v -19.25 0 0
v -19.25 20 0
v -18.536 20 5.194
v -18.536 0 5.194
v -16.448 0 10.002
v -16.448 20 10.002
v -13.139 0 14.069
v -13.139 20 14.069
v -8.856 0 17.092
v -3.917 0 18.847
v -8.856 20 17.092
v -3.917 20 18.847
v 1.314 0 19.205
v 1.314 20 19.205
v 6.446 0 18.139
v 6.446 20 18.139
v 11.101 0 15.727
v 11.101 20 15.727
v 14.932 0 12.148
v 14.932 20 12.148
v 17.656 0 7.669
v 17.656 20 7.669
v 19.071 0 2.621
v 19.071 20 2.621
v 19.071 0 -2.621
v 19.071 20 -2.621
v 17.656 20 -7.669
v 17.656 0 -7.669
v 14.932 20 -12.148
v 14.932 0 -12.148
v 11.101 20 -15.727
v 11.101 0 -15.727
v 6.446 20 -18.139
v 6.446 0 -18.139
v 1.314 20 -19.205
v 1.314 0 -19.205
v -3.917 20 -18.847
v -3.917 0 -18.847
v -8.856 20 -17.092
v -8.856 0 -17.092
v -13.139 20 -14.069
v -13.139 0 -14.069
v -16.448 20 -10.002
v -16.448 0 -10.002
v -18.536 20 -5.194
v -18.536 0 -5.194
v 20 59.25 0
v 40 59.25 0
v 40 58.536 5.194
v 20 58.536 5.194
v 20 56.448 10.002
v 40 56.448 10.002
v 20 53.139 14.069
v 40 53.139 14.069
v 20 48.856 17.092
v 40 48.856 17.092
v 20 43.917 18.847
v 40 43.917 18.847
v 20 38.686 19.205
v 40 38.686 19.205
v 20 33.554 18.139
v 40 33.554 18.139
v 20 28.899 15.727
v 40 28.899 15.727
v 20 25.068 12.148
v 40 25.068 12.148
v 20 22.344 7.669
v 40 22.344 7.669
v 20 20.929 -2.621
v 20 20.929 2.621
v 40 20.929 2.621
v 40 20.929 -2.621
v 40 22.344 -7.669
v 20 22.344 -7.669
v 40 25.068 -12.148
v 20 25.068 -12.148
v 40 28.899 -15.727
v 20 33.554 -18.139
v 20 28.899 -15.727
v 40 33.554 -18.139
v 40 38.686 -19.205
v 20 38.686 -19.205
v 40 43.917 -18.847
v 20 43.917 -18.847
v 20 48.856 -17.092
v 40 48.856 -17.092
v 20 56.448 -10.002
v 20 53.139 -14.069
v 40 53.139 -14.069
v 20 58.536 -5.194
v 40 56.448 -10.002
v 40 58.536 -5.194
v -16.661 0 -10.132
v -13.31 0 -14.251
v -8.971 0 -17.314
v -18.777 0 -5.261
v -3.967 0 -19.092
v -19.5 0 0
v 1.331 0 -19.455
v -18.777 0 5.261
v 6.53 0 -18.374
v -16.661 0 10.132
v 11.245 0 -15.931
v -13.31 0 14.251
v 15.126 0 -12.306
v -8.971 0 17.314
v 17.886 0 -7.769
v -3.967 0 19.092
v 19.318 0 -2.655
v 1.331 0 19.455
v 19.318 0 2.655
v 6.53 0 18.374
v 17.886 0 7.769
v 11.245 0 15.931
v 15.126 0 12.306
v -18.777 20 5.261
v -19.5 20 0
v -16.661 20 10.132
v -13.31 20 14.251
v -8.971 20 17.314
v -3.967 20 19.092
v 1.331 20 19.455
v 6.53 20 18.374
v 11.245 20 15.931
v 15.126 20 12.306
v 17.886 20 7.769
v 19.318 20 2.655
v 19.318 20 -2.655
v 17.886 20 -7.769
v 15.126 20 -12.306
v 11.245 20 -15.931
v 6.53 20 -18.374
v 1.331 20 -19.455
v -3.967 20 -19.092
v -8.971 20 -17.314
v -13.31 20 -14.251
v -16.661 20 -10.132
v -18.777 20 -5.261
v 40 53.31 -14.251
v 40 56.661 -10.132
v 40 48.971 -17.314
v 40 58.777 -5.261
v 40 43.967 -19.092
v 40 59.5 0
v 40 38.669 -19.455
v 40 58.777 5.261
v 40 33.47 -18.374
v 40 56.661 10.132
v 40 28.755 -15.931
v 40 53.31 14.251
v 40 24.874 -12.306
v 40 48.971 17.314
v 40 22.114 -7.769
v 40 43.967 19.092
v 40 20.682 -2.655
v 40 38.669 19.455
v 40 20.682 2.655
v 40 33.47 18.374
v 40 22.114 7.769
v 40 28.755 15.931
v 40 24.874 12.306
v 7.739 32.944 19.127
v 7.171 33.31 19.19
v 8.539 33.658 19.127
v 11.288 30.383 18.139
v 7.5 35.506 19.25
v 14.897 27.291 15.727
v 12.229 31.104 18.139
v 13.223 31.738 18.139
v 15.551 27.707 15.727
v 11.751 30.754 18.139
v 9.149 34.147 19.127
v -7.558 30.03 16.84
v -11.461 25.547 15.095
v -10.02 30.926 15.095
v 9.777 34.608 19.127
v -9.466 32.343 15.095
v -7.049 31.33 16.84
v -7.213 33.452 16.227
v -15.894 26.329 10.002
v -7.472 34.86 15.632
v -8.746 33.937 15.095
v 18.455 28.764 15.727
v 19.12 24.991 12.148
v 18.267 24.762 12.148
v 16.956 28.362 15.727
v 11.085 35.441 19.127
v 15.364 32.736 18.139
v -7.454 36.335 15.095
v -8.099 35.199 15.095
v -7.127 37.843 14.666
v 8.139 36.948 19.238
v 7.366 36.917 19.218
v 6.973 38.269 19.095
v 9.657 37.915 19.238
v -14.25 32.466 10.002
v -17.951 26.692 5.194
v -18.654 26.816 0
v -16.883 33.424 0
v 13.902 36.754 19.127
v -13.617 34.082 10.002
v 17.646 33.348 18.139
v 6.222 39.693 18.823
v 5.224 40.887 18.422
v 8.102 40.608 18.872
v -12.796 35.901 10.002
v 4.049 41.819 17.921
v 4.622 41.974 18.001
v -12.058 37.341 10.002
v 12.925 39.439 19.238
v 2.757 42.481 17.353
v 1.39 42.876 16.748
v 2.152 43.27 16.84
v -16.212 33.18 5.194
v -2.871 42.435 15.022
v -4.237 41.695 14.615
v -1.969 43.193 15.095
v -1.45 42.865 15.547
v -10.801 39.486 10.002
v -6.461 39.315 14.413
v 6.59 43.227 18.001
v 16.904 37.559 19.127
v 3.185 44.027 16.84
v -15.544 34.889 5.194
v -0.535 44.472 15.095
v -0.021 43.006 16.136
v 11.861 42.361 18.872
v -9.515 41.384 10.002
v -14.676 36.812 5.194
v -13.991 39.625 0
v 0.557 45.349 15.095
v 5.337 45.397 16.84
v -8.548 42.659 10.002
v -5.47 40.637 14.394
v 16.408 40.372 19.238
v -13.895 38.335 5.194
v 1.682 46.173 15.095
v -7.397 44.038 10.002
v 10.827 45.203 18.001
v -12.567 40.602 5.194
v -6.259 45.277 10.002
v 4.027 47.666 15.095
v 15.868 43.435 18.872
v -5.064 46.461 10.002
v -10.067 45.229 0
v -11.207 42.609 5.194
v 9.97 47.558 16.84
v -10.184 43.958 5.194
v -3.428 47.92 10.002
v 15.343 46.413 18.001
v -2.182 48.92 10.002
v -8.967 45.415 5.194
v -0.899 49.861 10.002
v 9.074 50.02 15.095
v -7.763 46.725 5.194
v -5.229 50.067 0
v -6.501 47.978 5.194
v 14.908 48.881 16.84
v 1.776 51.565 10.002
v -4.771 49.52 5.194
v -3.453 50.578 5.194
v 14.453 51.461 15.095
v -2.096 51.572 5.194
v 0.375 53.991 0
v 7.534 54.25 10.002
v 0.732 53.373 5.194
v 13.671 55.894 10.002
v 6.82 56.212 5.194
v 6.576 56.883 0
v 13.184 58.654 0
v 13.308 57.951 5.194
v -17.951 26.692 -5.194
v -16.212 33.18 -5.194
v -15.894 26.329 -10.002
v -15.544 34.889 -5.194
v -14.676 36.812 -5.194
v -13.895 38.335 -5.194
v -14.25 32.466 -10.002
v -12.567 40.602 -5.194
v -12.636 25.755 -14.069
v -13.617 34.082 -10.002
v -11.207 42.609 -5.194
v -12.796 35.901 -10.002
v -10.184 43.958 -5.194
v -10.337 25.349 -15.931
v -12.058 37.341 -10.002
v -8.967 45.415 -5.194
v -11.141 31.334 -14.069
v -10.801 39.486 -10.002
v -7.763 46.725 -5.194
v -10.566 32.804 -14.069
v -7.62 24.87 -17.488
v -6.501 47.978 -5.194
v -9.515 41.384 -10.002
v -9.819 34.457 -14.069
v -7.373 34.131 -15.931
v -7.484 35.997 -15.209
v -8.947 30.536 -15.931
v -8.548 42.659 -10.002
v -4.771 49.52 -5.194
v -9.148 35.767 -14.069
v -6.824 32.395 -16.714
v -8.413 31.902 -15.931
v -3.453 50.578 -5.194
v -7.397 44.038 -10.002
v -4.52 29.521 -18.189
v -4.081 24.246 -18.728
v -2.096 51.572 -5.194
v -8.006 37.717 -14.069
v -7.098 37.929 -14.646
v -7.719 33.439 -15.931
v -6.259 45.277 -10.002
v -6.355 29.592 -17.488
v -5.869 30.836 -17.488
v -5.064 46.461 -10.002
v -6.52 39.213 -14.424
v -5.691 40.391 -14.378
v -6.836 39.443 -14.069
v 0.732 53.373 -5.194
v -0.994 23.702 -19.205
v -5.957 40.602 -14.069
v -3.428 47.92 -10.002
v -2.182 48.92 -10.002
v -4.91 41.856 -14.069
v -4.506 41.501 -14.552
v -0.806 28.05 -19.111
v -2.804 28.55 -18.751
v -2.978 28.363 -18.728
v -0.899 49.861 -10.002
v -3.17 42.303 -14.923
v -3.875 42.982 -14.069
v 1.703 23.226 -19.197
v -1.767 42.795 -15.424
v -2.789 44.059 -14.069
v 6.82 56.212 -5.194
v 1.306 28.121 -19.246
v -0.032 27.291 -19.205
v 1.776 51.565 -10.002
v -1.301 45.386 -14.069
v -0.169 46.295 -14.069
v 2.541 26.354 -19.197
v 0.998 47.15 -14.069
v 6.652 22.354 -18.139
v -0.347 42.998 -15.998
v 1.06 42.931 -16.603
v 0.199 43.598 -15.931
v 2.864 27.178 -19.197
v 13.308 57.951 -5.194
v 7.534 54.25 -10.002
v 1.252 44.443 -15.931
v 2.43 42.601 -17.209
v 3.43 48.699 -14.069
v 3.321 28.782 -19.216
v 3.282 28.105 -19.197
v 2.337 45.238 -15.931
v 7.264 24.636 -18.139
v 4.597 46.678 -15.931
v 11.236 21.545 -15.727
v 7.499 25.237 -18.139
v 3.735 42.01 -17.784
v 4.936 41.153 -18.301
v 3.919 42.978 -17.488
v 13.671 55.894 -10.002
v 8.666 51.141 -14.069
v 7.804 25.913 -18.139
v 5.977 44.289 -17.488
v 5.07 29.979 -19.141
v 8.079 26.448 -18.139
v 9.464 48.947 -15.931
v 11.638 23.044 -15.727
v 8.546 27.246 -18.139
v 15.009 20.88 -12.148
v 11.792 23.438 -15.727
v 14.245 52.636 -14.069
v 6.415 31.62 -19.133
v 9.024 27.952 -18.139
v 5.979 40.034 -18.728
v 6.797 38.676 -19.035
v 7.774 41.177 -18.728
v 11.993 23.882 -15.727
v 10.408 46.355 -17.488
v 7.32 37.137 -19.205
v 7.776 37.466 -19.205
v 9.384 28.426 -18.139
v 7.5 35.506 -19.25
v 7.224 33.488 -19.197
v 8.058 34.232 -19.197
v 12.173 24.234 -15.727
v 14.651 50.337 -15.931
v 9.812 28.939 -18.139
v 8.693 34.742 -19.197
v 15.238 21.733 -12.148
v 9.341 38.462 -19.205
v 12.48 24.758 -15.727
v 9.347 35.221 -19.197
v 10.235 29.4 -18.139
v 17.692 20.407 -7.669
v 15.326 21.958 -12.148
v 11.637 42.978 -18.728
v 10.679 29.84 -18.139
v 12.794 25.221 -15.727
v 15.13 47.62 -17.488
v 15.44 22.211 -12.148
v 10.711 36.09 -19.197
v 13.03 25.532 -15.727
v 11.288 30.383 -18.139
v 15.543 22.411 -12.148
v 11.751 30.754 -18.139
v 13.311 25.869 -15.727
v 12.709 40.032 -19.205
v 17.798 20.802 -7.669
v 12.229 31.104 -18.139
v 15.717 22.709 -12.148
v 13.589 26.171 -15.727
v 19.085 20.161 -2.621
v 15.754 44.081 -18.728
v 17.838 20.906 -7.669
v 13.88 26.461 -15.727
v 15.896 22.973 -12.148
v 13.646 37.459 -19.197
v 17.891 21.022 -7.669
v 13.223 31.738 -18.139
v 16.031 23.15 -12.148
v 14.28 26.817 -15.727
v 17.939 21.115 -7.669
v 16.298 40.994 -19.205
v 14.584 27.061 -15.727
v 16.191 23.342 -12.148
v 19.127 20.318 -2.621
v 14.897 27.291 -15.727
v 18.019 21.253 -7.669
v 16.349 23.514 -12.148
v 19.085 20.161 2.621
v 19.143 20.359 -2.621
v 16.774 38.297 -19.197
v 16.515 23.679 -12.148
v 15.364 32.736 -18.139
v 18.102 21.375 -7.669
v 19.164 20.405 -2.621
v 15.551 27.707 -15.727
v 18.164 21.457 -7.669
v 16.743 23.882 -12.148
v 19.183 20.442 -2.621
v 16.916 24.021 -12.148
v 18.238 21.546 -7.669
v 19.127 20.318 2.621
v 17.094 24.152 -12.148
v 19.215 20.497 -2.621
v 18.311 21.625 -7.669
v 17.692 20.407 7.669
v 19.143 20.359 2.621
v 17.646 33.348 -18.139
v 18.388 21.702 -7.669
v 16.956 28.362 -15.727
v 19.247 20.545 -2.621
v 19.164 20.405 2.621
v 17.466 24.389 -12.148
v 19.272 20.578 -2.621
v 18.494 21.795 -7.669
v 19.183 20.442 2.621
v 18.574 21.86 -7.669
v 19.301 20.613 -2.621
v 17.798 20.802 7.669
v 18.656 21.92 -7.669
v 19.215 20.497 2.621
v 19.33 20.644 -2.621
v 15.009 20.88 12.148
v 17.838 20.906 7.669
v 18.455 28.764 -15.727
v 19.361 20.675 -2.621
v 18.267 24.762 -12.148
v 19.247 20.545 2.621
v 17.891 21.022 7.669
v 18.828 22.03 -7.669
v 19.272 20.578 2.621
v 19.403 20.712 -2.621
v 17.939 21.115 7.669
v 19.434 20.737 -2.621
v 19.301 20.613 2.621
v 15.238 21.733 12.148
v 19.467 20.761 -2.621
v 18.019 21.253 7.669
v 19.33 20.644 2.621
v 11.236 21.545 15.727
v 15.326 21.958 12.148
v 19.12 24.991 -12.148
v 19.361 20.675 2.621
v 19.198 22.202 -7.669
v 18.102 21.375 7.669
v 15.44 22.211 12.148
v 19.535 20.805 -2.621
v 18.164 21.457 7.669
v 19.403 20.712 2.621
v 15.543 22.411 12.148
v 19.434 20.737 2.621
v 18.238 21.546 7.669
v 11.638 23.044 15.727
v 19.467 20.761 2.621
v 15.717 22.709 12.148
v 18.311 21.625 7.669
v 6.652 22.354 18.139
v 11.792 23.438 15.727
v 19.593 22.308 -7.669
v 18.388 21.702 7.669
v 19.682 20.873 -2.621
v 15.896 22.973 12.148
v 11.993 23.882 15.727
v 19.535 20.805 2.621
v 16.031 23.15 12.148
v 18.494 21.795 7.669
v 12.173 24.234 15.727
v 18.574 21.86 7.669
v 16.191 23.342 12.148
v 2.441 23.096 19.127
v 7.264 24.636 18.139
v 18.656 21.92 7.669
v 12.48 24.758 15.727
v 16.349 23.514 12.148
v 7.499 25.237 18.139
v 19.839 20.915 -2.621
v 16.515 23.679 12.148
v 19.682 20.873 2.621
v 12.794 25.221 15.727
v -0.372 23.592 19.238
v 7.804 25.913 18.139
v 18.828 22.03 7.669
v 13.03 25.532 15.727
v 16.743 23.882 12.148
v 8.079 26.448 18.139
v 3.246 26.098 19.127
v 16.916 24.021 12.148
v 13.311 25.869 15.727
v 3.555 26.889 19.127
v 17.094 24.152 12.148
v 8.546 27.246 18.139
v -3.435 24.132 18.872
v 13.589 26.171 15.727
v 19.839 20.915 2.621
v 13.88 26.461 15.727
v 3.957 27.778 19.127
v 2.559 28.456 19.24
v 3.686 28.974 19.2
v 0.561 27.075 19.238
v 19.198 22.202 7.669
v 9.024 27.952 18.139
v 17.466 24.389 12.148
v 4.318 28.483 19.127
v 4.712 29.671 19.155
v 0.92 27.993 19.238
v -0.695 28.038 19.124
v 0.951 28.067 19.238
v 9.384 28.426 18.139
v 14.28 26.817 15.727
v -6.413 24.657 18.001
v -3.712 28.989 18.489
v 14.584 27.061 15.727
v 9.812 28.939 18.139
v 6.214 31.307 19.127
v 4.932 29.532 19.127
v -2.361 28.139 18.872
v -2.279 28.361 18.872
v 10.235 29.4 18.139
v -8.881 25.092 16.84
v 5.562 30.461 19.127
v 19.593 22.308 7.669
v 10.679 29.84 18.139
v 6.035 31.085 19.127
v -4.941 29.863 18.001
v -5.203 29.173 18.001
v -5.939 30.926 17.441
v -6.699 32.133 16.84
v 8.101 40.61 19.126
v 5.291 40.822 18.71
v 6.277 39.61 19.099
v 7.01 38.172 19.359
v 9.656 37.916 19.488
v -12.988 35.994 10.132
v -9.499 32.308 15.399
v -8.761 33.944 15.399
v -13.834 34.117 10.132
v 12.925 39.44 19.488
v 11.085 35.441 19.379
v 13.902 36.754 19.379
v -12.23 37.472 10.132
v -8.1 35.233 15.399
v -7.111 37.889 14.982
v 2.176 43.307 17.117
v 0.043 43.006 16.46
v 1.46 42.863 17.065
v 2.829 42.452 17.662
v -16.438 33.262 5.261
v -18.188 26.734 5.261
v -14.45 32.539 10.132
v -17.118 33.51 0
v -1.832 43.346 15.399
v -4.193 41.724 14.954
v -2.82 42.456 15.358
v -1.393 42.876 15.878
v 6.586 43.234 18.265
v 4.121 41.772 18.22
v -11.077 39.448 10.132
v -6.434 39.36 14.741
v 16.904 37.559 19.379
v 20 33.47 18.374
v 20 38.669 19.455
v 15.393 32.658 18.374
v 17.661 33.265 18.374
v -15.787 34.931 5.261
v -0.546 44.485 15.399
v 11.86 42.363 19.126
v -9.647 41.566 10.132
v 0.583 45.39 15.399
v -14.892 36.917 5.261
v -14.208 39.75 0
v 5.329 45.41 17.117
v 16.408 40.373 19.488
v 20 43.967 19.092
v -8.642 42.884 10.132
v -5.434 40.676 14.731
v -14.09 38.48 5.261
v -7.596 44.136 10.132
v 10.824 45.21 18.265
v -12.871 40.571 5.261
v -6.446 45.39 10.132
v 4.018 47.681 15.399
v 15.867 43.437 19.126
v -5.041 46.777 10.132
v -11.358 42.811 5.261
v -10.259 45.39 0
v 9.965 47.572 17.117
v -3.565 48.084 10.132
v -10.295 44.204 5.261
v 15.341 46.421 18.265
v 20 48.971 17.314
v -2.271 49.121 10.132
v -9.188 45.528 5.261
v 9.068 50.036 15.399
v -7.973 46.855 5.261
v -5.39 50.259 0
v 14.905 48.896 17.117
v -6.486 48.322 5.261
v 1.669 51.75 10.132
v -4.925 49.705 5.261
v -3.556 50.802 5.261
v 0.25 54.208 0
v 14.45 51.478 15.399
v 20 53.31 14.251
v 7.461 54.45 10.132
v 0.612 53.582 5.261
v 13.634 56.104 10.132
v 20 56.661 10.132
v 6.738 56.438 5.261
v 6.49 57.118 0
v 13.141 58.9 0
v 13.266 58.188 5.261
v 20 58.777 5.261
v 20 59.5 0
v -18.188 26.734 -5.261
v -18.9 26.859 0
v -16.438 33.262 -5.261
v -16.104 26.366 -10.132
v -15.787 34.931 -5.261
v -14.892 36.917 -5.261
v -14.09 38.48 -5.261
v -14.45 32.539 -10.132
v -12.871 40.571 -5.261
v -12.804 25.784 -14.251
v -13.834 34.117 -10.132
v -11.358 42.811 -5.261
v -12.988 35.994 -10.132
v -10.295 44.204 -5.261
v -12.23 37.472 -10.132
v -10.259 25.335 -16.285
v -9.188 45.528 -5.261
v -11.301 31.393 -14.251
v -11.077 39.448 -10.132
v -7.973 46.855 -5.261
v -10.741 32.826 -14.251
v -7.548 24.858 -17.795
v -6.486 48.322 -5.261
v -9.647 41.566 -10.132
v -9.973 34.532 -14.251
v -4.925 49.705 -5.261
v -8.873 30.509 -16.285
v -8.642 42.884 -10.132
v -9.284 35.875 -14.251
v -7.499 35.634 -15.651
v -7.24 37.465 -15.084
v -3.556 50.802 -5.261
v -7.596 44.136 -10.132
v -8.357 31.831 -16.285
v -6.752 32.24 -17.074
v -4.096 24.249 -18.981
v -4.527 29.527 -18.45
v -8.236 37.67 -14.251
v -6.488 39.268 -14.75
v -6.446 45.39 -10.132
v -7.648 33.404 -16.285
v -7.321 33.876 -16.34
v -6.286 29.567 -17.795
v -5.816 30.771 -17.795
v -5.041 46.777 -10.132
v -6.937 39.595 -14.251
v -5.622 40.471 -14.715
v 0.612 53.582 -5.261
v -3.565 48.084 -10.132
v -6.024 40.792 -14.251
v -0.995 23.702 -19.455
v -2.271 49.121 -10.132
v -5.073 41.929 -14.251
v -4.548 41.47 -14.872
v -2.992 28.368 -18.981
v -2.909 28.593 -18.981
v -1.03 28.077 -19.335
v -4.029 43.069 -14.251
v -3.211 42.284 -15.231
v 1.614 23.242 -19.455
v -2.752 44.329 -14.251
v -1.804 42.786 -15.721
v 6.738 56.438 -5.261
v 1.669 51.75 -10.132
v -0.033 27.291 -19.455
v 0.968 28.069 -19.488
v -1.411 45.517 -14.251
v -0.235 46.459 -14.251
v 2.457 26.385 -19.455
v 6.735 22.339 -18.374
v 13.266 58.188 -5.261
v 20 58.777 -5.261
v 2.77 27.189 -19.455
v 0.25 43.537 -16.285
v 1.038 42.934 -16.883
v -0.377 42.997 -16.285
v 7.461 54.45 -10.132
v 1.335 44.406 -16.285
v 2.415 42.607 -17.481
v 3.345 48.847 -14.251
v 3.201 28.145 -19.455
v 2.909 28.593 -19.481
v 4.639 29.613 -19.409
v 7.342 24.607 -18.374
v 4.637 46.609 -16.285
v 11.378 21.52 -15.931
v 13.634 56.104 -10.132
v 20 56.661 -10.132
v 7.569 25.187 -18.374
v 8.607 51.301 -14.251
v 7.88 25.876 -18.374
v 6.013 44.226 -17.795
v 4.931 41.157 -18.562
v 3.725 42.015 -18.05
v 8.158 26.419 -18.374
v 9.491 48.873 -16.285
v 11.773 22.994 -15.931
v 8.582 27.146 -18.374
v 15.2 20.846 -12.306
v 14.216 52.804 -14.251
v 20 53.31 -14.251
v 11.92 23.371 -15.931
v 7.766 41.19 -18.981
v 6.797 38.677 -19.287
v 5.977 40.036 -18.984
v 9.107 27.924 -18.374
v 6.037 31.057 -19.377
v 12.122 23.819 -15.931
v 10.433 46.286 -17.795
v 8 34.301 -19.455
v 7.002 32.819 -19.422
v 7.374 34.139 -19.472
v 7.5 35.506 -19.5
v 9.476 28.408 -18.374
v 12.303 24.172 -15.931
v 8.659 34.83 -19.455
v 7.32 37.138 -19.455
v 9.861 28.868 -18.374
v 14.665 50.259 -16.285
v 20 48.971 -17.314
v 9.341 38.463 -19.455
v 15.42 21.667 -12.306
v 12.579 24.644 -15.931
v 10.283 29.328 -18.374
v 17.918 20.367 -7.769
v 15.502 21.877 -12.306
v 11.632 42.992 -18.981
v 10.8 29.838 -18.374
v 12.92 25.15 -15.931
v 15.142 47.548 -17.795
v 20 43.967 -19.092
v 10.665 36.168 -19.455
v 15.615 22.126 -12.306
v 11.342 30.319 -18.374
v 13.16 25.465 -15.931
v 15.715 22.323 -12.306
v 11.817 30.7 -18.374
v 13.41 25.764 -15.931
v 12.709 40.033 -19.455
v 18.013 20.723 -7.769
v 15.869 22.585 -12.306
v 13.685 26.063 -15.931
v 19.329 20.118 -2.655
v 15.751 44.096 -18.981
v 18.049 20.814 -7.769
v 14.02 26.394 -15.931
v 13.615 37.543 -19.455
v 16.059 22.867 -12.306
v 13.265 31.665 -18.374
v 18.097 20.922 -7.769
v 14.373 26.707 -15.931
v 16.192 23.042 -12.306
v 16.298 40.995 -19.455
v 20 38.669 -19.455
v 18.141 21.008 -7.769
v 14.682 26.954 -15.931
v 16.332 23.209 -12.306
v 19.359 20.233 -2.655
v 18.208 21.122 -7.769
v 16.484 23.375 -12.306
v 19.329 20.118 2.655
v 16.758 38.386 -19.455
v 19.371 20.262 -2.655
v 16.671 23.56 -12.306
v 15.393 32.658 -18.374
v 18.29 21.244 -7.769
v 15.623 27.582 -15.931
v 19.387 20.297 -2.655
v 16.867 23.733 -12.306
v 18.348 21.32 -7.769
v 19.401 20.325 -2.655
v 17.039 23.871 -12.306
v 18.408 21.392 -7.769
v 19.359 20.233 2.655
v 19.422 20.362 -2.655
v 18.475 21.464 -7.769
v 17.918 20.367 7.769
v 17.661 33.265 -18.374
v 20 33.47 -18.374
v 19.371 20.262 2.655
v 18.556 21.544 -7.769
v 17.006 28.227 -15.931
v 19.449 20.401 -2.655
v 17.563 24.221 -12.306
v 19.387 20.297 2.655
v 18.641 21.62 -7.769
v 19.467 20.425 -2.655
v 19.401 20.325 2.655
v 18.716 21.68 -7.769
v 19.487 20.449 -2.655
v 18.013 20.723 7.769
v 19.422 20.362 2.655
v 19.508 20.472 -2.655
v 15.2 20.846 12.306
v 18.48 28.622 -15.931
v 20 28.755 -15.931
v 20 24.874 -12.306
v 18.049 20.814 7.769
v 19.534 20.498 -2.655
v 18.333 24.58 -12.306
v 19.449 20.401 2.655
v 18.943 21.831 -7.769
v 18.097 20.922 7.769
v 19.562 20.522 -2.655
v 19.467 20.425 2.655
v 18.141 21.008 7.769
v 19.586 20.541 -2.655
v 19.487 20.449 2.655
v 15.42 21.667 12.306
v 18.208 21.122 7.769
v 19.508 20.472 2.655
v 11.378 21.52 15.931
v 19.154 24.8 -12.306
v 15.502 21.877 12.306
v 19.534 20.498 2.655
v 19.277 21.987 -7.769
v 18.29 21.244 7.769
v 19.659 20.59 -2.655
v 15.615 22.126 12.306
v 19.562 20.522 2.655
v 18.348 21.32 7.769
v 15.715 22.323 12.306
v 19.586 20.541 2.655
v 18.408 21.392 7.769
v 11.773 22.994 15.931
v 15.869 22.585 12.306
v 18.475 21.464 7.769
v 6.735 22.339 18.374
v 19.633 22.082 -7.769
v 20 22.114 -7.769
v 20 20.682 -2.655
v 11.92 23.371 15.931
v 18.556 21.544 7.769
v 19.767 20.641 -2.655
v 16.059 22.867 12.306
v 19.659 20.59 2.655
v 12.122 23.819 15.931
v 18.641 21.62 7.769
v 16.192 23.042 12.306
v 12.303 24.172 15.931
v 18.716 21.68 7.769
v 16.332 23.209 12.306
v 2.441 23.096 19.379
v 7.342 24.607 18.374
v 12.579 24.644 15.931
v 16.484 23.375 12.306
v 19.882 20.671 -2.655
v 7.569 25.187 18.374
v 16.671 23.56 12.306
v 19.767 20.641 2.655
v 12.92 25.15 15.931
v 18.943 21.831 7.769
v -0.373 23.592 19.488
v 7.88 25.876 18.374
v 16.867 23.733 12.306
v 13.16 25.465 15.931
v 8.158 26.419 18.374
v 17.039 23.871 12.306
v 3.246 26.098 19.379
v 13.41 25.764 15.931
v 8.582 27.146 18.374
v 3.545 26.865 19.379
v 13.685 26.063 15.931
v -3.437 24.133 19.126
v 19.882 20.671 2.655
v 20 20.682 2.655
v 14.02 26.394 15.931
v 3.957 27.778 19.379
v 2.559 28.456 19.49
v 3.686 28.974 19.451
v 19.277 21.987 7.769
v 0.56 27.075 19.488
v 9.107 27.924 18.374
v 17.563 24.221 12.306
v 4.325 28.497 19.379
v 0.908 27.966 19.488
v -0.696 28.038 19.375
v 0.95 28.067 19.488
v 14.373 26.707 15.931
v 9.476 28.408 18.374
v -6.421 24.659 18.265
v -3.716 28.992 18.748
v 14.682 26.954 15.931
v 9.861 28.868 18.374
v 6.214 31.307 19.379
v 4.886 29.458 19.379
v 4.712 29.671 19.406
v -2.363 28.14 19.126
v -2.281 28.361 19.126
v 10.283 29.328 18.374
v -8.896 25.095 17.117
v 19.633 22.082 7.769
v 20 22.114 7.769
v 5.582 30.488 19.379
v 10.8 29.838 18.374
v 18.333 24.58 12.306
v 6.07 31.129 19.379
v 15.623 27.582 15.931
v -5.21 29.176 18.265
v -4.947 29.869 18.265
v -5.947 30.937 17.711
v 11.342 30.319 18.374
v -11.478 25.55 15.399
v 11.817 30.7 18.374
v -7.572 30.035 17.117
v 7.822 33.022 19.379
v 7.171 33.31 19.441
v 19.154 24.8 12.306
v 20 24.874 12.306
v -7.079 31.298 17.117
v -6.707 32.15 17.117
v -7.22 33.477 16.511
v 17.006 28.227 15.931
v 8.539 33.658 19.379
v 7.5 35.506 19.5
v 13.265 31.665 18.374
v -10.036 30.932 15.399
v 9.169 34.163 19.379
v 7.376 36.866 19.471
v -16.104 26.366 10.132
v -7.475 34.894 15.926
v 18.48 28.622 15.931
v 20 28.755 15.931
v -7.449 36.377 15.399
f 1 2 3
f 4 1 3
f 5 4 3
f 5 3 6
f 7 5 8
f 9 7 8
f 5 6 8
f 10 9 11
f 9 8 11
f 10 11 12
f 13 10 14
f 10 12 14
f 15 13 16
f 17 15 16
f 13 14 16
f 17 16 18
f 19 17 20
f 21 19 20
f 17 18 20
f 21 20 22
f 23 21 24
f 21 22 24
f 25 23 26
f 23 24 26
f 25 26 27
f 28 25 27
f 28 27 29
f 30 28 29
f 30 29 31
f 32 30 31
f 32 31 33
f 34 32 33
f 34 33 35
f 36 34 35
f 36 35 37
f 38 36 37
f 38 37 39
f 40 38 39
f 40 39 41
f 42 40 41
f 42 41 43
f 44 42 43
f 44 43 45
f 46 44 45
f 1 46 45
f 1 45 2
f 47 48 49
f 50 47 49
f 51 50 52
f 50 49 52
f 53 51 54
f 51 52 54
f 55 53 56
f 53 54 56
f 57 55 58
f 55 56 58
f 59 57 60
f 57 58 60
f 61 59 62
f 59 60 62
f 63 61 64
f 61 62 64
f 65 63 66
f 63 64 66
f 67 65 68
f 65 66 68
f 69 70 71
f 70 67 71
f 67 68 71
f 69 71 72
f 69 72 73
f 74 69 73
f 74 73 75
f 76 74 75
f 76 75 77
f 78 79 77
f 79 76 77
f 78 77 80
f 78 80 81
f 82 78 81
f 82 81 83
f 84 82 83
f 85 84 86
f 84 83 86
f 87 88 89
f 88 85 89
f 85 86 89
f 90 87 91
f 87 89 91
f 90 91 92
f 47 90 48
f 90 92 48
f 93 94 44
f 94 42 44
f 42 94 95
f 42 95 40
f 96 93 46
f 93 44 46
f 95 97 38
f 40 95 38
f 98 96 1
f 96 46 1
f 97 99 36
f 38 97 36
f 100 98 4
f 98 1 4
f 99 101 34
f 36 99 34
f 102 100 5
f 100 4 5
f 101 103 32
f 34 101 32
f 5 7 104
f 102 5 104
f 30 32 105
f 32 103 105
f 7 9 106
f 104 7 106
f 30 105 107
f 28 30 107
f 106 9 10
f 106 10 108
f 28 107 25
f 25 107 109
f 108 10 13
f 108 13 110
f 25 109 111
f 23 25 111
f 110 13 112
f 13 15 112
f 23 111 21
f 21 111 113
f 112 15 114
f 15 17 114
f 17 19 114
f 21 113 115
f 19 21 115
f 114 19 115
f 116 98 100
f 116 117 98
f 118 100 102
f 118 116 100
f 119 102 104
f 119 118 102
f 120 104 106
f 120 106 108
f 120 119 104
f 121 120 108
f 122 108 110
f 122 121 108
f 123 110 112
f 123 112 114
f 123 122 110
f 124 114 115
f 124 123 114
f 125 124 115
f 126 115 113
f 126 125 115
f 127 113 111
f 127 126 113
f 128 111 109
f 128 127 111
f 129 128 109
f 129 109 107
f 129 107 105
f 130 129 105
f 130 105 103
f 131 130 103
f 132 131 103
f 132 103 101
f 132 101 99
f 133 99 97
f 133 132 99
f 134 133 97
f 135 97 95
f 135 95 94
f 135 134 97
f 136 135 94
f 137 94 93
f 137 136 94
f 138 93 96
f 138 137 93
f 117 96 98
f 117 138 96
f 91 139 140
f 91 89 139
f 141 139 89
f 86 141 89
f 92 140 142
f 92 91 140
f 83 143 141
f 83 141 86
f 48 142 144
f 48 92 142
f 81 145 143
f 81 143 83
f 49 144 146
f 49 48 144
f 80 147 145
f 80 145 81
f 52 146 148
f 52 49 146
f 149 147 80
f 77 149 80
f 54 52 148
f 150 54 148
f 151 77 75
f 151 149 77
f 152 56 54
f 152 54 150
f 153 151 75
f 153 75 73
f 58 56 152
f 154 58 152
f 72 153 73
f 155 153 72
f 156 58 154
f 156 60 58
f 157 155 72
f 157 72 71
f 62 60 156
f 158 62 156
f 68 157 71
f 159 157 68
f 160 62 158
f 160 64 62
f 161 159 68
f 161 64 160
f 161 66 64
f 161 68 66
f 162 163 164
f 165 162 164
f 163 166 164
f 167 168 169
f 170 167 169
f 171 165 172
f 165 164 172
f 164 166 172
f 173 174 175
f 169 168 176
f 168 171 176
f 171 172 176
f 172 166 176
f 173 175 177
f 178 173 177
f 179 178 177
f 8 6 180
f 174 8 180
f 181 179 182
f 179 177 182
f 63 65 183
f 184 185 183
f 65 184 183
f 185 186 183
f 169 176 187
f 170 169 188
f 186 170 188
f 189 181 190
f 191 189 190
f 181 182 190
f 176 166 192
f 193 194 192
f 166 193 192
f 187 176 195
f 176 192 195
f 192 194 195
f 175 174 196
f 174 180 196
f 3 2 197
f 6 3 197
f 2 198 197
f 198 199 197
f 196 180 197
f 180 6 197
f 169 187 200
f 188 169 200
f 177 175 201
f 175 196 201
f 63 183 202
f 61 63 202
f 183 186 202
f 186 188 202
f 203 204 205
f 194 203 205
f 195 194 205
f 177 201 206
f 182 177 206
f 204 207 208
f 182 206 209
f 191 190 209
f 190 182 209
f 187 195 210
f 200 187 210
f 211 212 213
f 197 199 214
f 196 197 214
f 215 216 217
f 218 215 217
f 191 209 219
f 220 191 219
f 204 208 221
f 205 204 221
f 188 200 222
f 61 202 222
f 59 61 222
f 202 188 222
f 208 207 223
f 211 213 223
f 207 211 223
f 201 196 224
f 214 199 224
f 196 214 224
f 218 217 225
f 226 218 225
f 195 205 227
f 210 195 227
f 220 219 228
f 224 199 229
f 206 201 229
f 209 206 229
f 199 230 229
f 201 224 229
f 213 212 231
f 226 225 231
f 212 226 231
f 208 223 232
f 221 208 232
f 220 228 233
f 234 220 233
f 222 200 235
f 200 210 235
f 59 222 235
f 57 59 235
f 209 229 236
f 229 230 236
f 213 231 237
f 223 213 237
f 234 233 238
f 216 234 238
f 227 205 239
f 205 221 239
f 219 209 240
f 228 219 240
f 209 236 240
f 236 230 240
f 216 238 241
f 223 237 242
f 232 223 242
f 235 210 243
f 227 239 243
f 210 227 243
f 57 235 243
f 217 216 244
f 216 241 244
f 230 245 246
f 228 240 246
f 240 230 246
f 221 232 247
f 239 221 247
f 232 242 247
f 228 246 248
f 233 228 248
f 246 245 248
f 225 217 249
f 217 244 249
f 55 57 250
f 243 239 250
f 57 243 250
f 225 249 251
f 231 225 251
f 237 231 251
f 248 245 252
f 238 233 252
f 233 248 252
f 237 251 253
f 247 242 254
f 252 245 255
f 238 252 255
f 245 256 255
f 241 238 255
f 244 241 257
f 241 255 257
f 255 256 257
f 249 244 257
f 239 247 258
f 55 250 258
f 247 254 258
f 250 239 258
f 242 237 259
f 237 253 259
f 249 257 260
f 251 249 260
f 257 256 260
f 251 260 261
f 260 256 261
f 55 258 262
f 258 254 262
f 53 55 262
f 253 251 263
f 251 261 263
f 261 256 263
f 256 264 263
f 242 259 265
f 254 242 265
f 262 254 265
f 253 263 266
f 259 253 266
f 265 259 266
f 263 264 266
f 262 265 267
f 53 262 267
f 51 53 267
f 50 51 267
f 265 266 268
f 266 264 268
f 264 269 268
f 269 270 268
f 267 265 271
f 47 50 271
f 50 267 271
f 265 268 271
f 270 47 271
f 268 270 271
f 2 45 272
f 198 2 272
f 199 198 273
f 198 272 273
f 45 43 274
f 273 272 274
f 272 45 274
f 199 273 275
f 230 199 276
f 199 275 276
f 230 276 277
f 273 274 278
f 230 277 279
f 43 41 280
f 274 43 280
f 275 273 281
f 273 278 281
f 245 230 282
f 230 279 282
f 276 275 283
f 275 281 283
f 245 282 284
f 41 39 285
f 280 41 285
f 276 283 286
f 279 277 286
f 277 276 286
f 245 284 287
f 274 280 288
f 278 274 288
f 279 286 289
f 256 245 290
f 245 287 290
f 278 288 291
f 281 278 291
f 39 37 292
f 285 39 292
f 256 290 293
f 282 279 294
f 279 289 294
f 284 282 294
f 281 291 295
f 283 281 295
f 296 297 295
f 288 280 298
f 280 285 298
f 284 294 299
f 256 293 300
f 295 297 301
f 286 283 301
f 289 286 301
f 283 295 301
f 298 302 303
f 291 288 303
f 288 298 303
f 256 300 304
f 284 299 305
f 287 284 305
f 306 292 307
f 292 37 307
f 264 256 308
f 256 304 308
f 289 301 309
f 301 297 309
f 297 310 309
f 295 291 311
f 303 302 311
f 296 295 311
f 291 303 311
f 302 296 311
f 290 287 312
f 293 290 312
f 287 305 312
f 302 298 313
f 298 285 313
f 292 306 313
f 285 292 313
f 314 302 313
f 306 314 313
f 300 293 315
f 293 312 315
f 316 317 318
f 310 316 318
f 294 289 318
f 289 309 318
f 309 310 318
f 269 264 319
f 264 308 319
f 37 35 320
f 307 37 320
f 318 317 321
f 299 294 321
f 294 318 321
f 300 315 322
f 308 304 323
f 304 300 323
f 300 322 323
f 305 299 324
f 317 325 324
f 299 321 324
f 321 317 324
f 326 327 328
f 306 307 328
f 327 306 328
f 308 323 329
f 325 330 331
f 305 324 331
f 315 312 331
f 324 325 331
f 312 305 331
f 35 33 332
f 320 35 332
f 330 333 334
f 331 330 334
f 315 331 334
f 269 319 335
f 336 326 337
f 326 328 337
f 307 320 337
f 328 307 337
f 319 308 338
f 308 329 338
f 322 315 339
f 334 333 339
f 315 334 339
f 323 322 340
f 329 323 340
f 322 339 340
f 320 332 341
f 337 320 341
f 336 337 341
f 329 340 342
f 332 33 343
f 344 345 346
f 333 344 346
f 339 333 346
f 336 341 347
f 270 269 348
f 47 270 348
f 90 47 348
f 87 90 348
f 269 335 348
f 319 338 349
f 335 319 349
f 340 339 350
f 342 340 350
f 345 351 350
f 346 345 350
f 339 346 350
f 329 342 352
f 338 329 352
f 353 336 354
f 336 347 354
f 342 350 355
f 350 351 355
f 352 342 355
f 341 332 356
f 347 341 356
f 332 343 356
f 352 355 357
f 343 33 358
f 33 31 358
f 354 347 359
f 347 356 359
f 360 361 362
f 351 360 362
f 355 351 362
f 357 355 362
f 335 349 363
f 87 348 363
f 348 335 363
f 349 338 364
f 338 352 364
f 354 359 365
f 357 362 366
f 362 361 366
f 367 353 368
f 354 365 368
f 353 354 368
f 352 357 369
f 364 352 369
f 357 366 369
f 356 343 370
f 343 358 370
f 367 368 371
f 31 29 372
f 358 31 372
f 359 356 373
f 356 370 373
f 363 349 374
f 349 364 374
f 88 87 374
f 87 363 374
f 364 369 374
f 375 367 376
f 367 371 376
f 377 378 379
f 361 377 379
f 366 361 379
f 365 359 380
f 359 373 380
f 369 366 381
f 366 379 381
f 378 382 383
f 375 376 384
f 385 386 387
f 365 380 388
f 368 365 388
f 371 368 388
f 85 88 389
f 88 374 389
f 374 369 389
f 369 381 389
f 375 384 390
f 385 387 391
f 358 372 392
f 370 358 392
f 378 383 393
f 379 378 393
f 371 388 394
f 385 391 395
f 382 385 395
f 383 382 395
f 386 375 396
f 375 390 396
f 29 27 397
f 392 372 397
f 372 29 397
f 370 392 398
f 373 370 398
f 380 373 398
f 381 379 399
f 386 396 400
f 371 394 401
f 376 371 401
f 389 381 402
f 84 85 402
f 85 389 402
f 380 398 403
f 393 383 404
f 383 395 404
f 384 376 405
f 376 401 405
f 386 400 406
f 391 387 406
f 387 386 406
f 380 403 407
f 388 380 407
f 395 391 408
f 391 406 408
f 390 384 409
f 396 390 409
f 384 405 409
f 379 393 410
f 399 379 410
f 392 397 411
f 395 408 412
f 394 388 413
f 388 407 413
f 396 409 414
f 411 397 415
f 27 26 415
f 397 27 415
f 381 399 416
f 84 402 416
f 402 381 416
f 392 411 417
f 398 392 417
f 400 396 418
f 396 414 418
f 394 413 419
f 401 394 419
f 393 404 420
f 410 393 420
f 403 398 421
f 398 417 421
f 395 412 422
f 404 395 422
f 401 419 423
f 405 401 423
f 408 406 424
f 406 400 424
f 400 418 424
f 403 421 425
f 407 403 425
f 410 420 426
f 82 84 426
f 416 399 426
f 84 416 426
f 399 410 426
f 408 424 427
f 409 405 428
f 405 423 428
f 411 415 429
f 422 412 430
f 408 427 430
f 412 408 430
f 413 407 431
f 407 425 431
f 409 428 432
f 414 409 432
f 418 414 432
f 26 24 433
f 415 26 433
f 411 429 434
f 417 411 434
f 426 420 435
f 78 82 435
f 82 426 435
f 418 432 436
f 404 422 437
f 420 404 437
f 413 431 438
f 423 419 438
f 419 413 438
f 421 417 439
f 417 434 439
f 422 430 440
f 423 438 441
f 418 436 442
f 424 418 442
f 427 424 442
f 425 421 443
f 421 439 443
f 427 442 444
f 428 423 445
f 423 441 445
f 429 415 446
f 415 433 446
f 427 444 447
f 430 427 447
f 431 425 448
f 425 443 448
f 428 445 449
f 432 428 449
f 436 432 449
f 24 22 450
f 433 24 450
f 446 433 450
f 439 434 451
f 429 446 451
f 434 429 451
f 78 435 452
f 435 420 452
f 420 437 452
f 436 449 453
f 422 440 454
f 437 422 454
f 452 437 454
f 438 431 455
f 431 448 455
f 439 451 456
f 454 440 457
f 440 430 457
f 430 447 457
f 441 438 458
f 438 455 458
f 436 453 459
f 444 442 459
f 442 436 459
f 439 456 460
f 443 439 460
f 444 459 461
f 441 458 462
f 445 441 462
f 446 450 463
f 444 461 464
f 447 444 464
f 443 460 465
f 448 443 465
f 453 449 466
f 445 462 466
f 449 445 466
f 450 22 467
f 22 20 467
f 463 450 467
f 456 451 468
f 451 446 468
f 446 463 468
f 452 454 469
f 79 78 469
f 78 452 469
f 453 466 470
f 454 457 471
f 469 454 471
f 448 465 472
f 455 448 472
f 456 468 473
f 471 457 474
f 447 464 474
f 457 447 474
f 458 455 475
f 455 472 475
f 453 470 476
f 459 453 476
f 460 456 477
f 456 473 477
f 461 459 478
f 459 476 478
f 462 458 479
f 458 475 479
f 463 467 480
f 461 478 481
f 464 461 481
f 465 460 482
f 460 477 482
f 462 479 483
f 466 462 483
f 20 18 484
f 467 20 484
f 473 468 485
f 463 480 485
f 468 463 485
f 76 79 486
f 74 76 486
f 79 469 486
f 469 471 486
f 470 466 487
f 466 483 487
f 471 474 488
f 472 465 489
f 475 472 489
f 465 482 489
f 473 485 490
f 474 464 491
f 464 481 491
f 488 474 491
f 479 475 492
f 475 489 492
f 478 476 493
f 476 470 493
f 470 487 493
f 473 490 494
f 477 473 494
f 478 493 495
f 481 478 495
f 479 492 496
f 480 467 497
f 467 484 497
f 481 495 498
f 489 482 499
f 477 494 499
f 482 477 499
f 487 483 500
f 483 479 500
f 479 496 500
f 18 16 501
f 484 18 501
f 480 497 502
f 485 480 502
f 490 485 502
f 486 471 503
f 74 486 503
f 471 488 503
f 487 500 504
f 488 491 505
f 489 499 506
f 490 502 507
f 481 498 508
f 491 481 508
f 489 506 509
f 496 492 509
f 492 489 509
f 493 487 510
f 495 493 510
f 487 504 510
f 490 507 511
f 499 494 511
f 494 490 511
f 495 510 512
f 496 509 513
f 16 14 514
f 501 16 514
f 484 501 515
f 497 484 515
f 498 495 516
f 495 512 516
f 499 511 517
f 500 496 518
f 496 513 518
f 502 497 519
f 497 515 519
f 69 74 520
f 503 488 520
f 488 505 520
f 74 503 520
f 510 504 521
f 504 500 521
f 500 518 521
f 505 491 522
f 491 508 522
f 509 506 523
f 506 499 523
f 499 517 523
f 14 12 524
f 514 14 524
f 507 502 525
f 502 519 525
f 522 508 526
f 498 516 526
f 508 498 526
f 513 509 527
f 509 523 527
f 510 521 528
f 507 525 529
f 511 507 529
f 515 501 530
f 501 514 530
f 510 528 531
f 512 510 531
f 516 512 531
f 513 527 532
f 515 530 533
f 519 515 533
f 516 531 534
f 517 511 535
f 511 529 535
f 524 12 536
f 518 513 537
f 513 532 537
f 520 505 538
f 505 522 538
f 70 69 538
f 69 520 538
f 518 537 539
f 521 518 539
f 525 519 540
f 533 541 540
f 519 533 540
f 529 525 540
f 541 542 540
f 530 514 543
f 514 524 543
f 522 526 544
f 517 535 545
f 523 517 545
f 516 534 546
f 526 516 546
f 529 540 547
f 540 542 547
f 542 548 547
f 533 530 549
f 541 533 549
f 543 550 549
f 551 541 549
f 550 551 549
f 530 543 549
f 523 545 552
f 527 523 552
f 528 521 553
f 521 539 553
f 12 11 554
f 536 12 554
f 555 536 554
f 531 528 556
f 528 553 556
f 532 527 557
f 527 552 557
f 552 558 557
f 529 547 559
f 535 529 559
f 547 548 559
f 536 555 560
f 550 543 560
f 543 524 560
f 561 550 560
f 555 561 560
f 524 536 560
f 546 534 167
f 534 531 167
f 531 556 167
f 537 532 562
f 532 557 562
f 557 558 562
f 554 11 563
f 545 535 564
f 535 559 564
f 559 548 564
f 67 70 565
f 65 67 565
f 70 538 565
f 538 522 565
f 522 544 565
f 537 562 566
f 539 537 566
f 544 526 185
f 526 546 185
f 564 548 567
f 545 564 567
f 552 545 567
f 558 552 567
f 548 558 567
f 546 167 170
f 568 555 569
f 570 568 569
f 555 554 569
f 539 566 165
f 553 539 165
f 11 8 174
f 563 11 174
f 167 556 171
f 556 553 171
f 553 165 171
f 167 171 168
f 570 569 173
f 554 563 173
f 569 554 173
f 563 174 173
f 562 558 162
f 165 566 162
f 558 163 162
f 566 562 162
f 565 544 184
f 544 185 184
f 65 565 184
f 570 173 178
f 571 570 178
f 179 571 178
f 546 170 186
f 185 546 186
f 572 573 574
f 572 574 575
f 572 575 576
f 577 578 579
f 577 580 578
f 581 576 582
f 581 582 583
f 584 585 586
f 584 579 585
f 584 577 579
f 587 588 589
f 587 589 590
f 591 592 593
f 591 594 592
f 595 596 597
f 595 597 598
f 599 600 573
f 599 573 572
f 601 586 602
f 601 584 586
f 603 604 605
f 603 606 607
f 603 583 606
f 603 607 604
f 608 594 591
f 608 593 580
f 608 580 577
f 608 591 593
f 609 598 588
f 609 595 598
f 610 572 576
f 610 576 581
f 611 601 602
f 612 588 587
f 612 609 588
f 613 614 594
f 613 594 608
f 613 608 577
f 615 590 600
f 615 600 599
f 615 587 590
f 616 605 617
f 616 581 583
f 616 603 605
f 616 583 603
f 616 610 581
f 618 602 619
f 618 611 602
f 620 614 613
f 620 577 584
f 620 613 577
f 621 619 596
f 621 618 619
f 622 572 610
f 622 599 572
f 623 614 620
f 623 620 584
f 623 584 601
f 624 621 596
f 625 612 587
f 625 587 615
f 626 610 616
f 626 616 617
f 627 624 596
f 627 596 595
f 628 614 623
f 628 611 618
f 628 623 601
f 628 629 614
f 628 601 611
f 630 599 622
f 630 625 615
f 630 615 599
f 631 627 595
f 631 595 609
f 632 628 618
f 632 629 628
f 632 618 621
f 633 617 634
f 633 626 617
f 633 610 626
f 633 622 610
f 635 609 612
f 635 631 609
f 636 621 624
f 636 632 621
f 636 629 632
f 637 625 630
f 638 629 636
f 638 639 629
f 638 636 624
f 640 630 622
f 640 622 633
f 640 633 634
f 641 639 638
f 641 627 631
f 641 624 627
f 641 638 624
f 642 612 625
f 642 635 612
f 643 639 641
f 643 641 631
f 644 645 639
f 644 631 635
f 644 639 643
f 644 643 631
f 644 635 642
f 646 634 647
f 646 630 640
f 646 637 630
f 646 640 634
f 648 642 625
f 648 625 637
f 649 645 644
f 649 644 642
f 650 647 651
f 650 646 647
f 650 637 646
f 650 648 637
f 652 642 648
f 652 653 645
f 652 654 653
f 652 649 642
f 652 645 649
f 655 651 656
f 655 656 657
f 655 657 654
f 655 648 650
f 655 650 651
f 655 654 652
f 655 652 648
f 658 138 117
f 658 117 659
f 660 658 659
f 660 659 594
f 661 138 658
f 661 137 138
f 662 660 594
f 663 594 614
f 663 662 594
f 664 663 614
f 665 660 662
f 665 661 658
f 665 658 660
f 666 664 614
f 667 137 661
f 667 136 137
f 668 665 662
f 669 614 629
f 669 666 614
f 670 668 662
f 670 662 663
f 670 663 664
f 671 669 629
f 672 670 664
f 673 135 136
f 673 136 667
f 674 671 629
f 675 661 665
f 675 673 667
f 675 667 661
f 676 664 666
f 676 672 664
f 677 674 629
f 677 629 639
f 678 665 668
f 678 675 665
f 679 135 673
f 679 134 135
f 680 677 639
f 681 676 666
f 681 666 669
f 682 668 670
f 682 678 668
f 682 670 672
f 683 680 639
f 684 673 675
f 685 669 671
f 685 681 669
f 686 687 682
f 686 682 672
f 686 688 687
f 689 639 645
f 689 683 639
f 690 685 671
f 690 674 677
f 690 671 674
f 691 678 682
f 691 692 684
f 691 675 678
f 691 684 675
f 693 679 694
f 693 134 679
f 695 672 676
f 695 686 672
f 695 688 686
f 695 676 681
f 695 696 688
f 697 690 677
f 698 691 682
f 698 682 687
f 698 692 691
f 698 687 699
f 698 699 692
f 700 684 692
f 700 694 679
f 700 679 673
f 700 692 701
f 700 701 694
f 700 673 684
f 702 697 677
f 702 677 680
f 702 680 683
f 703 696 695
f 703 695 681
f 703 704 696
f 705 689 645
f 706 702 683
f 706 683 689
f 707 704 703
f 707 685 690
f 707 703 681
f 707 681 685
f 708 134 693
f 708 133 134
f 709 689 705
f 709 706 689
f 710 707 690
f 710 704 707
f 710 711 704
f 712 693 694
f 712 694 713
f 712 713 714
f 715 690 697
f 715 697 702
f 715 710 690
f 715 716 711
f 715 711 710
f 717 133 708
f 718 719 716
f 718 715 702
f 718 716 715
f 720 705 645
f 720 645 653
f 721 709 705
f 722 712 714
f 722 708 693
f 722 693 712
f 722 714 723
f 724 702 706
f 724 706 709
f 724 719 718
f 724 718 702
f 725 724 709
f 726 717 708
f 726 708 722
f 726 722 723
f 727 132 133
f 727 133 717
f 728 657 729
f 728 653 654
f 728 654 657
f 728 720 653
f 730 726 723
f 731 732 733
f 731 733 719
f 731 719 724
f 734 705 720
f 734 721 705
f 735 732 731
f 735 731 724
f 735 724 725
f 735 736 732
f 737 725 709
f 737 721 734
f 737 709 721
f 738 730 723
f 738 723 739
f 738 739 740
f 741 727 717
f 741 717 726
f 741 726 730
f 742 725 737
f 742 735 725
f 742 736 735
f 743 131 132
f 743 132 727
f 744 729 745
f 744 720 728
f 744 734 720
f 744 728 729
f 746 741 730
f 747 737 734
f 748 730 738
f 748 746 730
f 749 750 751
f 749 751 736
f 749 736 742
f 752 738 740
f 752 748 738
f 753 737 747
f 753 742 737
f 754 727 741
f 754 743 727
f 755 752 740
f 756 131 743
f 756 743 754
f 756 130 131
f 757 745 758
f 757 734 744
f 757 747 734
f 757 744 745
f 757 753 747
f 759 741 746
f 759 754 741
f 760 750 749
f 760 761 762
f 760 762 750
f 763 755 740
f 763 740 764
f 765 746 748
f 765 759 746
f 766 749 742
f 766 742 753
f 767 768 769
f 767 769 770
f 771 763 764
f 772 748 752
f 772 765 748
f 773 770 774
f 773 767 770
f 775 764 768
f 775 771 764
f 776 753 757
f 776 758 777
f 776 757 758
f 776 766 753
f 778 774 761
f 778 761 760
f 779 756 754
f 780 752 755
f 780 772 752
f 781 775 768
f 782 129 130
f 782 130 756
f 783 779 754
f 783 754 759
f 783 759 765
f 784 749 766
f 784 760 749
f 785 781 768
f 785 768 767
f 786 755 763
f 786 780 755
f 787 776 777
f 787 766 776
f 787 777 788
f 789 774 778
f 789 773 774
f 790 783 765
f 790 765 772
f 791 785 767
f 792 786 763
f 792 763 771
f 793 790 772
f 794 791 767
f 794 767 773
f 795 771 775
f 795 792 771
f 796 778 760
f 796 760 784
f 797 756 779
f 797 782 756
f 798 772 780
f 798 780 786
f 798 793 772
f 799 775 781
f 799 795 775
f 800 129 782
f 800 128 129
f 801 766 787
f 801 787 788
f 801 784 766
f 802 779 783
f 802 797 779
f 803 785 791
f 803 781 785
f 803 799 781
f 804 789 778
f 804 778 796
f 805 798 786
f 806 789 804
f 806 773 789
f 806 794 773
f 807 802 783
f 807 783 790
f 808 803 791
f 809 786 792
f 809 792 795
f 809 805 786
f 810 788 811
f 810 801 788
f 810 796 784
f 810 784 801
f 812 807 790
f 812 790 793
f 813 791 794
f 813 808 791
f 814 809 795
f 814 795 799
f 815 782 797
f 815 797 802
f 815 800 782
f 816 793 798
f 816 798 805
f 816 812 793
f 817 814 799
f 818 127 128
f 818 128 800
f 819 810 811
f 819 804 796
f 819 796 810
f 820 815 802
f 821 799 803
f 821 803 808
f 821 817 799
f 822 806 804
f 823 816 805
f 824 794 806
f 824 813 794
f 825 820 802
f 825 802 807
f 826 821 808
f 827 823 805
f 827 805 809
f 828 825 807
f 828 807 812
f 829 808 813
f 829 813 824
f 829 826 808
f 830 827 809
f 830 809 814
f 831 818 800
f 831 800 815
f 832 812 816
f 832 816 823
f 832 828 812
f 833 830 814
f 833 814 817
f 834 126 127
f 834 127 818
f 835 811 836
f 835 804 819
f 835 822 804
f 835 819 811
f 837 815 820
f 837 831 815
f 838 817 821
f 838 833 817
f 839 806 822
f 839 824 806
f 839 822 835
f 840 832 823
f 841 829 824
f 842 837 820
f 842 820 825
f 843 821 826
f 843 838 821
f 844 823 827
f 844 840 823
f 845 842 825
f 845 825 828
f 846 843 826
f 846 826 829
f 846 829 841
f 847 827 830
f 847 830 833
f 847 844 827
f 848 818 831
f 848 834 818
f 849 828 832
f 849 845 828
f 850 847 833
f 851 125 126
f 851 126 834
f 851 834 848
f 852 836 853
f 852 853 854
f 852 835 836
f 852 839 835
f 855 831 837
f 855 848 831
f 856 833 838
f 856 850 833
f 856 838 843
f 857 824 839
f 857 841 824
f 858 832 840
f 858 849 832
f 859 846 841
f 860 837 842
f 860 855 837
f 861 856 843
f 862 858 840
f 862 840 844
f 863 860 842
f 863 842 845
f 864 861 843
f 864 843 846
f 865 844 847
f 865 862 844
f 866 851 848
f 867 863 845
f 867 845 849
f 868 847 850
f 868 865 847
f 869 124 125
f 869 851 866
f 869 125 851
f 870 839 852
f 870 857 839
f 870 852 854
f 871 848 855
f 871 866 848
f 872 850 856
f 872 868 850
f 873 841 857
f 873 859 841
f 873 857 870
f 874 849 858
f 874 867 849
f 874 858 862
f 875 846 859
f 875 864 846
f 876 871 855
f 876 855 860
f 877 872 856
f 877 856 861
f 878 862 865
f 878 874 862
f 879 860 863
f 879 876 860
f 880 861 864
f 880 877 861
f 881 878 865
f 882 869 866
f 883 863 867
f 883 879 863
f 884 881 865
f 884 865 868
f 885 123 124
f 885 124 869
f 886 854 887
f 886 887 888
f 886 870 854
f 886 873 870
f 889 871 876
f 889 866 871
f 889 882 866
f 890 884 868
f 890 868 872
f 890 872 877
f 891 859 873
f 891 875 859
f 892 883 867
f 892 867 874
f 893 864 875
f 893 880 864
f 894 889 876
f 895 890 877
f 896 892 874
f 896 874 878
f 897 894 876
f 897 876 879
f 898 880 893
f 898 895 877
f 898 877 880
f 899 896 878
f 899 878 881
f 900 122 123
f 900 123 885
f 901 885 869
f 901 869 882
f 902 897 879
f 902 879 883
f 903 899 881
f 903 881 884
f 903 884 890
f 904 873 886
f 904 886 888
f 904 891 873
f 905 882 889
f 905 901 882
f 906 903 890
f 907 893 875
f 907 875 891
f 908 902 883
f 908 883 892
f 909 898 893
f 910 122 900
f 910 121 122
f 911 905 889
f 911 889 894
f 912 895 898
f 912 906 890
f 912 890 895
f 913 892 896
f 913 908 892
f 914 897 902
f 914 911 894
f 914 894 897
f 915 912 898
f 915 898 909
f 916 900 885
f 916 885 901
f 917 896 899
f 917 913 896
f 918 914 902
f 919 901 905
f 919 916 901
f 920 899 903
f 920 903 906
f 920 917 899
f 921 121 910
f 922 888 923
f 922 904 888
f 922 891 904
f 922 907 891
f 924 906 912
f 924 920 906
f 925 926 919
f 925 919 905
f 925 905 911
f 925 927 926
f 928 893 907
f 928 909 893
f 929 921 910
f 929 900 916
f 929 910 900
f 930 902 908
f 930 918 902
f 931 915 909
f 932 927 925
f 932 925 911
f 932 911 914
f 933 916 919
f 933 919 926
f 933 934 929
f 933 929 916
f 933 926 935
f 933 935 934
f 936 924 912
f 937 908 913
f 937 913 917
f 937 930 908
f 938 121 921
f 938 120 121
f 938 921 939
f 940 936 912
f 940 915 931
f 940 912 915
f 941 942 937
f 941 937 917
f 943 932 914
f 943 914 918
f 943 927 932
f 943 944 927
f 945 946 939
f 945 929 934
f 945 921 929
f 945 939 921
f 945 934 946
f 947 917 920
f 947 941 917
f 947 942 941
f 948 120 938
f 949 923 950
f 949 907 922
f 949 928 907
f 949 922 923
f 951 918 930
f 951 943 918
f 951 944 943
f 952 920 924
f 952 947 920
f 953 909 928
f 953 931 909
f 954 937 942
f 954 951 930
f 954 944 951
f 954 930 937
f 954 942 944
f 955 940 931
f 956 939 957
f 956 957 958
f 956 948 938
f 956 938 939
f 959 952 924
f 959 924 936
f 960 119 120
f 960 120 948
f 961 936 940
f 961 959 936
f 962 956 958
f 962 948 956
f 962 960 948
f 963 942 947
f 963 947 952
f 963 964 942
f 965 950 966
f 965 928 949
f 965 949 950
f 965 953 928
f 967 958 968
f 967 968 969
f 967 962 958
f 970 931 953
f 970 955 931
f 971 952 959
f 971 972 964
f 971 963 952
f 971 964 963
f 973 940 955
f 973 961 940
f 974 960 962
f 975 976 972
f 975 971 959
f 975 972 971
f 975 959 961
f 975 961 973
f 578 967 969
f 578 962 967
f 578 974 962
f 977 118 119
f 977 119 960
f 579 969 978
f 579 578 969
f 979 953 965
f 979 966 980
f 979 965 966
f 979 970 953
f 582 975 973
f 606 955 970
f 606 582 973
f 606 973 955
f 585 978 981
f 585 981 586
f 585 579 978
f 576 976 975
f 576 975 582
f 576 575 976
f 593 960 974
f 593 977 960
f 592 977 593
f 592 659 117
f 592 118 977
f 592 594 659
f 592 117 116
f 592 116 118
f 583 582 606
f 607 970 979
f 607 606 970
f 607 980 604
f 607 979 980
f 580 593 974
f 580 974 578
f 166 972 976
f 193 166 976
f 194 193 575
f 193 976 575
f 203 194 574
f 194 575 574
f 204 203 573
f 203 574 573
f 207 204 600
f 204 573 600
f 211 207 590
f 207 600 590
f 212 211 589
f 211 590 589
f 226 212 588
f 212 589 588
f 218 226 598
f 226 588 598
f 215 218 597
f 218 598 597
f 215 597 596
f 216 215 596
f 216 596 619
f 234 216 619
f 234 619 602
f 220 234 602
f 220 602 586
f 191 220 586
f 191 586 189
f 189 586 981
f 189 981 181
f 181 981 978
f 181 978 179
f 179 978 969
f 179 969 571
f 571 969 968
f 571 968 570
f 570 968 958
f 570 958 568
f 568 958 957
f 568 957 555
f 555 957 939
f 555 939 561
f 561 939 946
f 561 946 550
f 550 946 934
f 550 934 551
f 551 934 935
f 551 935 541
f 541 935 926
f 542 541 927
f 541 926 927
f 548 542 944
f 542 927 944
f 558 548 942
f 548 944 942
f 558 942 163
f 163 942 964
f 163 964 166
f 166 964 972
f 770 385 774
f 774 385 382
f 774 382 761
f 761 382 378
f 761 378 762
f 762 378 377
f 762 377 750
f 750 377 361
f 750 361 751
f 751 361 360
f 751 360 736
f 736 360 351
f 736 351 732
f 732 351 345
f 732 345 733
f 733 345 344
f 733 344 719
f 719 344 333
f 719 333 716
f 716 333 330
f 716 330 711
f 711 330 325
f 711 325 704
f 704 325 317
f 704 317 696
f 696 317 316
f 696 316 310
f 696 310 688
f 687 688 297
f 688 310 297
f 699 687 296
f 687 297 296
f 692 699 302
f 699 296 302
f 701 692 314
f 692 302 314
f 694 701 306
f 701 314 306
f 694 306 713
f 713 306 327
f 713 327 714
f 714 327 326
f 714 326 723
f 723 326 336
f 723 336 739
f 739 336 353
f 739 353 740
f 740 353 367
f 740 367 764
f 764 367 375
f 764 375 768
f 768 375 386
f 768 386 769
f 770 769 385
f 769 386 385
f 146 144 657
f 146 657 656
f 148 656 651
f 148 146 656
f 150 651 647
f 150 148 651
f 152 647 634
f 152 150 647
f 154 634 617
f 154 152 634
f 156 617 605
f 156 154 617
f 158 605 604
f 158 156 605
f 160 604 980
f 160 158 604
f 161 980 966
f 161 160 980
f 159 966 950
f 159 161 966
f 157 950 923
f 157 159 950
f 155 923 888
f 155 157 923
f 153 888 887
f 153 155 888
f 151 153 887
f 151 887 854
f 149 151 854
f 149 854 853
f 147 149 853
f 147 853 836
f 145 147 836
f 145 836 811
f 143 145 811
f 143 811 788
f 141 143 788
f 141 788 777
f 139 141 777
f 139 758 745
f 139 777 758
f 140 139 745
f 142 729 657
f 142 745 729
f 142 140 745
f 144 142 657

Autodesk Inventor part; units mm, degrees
ref_plane "YZ Plane" through (0, 0, 0) normal (1, 0, 0) x (0, 1, 0)
ref_plane "XZ Plane" through (0, 0, 0) normal (0, 1, 0) x (-1, 0, 0)
ref_plane "XY Plane" through (0, 0, 0) normal (0, 0, 1) x (1, 0, 0)
sketch "Sketch1" plane through (0, 0, 0) normal (0, 0, 1) x (1, 0, 0)
  line L0 (0, 0) -> (0, 20)
  line L1 (20, 40) -> (40, 40)
  arc A0 (20, 40) -> (0, 20) centre (20, 20) ccw
  point P0 (0, 40)
  dimension "d0" = 40
  dimension "d1" = 40
  dimension "d2" = 20
sketch "Sketch2" plane through (0, 0, 0) normal (0, 1, 0) x (-1, 0, 0)
  circle A0 centre (0, 0) radius 19.5
  circle A1 centre (0, 0) radius 19.25
  dimension "d3" = 39
  dimension "d4" = 38.5
sweep "Sweep1" add profiles "Sketch2" path "Sketch1"
sketch "Sketch4" plane through (0, 0, 0) normal (0, 0, 1) x (1, 0, 0)
  circle A0 centre (0, 35.5061) radius 7.5
  point P0 (0, 0)
  dimension "d10" = 15
extrude "Extrusion2" cut sketch "Sketch4" against normal mid plane 40
properties part number "elb"
